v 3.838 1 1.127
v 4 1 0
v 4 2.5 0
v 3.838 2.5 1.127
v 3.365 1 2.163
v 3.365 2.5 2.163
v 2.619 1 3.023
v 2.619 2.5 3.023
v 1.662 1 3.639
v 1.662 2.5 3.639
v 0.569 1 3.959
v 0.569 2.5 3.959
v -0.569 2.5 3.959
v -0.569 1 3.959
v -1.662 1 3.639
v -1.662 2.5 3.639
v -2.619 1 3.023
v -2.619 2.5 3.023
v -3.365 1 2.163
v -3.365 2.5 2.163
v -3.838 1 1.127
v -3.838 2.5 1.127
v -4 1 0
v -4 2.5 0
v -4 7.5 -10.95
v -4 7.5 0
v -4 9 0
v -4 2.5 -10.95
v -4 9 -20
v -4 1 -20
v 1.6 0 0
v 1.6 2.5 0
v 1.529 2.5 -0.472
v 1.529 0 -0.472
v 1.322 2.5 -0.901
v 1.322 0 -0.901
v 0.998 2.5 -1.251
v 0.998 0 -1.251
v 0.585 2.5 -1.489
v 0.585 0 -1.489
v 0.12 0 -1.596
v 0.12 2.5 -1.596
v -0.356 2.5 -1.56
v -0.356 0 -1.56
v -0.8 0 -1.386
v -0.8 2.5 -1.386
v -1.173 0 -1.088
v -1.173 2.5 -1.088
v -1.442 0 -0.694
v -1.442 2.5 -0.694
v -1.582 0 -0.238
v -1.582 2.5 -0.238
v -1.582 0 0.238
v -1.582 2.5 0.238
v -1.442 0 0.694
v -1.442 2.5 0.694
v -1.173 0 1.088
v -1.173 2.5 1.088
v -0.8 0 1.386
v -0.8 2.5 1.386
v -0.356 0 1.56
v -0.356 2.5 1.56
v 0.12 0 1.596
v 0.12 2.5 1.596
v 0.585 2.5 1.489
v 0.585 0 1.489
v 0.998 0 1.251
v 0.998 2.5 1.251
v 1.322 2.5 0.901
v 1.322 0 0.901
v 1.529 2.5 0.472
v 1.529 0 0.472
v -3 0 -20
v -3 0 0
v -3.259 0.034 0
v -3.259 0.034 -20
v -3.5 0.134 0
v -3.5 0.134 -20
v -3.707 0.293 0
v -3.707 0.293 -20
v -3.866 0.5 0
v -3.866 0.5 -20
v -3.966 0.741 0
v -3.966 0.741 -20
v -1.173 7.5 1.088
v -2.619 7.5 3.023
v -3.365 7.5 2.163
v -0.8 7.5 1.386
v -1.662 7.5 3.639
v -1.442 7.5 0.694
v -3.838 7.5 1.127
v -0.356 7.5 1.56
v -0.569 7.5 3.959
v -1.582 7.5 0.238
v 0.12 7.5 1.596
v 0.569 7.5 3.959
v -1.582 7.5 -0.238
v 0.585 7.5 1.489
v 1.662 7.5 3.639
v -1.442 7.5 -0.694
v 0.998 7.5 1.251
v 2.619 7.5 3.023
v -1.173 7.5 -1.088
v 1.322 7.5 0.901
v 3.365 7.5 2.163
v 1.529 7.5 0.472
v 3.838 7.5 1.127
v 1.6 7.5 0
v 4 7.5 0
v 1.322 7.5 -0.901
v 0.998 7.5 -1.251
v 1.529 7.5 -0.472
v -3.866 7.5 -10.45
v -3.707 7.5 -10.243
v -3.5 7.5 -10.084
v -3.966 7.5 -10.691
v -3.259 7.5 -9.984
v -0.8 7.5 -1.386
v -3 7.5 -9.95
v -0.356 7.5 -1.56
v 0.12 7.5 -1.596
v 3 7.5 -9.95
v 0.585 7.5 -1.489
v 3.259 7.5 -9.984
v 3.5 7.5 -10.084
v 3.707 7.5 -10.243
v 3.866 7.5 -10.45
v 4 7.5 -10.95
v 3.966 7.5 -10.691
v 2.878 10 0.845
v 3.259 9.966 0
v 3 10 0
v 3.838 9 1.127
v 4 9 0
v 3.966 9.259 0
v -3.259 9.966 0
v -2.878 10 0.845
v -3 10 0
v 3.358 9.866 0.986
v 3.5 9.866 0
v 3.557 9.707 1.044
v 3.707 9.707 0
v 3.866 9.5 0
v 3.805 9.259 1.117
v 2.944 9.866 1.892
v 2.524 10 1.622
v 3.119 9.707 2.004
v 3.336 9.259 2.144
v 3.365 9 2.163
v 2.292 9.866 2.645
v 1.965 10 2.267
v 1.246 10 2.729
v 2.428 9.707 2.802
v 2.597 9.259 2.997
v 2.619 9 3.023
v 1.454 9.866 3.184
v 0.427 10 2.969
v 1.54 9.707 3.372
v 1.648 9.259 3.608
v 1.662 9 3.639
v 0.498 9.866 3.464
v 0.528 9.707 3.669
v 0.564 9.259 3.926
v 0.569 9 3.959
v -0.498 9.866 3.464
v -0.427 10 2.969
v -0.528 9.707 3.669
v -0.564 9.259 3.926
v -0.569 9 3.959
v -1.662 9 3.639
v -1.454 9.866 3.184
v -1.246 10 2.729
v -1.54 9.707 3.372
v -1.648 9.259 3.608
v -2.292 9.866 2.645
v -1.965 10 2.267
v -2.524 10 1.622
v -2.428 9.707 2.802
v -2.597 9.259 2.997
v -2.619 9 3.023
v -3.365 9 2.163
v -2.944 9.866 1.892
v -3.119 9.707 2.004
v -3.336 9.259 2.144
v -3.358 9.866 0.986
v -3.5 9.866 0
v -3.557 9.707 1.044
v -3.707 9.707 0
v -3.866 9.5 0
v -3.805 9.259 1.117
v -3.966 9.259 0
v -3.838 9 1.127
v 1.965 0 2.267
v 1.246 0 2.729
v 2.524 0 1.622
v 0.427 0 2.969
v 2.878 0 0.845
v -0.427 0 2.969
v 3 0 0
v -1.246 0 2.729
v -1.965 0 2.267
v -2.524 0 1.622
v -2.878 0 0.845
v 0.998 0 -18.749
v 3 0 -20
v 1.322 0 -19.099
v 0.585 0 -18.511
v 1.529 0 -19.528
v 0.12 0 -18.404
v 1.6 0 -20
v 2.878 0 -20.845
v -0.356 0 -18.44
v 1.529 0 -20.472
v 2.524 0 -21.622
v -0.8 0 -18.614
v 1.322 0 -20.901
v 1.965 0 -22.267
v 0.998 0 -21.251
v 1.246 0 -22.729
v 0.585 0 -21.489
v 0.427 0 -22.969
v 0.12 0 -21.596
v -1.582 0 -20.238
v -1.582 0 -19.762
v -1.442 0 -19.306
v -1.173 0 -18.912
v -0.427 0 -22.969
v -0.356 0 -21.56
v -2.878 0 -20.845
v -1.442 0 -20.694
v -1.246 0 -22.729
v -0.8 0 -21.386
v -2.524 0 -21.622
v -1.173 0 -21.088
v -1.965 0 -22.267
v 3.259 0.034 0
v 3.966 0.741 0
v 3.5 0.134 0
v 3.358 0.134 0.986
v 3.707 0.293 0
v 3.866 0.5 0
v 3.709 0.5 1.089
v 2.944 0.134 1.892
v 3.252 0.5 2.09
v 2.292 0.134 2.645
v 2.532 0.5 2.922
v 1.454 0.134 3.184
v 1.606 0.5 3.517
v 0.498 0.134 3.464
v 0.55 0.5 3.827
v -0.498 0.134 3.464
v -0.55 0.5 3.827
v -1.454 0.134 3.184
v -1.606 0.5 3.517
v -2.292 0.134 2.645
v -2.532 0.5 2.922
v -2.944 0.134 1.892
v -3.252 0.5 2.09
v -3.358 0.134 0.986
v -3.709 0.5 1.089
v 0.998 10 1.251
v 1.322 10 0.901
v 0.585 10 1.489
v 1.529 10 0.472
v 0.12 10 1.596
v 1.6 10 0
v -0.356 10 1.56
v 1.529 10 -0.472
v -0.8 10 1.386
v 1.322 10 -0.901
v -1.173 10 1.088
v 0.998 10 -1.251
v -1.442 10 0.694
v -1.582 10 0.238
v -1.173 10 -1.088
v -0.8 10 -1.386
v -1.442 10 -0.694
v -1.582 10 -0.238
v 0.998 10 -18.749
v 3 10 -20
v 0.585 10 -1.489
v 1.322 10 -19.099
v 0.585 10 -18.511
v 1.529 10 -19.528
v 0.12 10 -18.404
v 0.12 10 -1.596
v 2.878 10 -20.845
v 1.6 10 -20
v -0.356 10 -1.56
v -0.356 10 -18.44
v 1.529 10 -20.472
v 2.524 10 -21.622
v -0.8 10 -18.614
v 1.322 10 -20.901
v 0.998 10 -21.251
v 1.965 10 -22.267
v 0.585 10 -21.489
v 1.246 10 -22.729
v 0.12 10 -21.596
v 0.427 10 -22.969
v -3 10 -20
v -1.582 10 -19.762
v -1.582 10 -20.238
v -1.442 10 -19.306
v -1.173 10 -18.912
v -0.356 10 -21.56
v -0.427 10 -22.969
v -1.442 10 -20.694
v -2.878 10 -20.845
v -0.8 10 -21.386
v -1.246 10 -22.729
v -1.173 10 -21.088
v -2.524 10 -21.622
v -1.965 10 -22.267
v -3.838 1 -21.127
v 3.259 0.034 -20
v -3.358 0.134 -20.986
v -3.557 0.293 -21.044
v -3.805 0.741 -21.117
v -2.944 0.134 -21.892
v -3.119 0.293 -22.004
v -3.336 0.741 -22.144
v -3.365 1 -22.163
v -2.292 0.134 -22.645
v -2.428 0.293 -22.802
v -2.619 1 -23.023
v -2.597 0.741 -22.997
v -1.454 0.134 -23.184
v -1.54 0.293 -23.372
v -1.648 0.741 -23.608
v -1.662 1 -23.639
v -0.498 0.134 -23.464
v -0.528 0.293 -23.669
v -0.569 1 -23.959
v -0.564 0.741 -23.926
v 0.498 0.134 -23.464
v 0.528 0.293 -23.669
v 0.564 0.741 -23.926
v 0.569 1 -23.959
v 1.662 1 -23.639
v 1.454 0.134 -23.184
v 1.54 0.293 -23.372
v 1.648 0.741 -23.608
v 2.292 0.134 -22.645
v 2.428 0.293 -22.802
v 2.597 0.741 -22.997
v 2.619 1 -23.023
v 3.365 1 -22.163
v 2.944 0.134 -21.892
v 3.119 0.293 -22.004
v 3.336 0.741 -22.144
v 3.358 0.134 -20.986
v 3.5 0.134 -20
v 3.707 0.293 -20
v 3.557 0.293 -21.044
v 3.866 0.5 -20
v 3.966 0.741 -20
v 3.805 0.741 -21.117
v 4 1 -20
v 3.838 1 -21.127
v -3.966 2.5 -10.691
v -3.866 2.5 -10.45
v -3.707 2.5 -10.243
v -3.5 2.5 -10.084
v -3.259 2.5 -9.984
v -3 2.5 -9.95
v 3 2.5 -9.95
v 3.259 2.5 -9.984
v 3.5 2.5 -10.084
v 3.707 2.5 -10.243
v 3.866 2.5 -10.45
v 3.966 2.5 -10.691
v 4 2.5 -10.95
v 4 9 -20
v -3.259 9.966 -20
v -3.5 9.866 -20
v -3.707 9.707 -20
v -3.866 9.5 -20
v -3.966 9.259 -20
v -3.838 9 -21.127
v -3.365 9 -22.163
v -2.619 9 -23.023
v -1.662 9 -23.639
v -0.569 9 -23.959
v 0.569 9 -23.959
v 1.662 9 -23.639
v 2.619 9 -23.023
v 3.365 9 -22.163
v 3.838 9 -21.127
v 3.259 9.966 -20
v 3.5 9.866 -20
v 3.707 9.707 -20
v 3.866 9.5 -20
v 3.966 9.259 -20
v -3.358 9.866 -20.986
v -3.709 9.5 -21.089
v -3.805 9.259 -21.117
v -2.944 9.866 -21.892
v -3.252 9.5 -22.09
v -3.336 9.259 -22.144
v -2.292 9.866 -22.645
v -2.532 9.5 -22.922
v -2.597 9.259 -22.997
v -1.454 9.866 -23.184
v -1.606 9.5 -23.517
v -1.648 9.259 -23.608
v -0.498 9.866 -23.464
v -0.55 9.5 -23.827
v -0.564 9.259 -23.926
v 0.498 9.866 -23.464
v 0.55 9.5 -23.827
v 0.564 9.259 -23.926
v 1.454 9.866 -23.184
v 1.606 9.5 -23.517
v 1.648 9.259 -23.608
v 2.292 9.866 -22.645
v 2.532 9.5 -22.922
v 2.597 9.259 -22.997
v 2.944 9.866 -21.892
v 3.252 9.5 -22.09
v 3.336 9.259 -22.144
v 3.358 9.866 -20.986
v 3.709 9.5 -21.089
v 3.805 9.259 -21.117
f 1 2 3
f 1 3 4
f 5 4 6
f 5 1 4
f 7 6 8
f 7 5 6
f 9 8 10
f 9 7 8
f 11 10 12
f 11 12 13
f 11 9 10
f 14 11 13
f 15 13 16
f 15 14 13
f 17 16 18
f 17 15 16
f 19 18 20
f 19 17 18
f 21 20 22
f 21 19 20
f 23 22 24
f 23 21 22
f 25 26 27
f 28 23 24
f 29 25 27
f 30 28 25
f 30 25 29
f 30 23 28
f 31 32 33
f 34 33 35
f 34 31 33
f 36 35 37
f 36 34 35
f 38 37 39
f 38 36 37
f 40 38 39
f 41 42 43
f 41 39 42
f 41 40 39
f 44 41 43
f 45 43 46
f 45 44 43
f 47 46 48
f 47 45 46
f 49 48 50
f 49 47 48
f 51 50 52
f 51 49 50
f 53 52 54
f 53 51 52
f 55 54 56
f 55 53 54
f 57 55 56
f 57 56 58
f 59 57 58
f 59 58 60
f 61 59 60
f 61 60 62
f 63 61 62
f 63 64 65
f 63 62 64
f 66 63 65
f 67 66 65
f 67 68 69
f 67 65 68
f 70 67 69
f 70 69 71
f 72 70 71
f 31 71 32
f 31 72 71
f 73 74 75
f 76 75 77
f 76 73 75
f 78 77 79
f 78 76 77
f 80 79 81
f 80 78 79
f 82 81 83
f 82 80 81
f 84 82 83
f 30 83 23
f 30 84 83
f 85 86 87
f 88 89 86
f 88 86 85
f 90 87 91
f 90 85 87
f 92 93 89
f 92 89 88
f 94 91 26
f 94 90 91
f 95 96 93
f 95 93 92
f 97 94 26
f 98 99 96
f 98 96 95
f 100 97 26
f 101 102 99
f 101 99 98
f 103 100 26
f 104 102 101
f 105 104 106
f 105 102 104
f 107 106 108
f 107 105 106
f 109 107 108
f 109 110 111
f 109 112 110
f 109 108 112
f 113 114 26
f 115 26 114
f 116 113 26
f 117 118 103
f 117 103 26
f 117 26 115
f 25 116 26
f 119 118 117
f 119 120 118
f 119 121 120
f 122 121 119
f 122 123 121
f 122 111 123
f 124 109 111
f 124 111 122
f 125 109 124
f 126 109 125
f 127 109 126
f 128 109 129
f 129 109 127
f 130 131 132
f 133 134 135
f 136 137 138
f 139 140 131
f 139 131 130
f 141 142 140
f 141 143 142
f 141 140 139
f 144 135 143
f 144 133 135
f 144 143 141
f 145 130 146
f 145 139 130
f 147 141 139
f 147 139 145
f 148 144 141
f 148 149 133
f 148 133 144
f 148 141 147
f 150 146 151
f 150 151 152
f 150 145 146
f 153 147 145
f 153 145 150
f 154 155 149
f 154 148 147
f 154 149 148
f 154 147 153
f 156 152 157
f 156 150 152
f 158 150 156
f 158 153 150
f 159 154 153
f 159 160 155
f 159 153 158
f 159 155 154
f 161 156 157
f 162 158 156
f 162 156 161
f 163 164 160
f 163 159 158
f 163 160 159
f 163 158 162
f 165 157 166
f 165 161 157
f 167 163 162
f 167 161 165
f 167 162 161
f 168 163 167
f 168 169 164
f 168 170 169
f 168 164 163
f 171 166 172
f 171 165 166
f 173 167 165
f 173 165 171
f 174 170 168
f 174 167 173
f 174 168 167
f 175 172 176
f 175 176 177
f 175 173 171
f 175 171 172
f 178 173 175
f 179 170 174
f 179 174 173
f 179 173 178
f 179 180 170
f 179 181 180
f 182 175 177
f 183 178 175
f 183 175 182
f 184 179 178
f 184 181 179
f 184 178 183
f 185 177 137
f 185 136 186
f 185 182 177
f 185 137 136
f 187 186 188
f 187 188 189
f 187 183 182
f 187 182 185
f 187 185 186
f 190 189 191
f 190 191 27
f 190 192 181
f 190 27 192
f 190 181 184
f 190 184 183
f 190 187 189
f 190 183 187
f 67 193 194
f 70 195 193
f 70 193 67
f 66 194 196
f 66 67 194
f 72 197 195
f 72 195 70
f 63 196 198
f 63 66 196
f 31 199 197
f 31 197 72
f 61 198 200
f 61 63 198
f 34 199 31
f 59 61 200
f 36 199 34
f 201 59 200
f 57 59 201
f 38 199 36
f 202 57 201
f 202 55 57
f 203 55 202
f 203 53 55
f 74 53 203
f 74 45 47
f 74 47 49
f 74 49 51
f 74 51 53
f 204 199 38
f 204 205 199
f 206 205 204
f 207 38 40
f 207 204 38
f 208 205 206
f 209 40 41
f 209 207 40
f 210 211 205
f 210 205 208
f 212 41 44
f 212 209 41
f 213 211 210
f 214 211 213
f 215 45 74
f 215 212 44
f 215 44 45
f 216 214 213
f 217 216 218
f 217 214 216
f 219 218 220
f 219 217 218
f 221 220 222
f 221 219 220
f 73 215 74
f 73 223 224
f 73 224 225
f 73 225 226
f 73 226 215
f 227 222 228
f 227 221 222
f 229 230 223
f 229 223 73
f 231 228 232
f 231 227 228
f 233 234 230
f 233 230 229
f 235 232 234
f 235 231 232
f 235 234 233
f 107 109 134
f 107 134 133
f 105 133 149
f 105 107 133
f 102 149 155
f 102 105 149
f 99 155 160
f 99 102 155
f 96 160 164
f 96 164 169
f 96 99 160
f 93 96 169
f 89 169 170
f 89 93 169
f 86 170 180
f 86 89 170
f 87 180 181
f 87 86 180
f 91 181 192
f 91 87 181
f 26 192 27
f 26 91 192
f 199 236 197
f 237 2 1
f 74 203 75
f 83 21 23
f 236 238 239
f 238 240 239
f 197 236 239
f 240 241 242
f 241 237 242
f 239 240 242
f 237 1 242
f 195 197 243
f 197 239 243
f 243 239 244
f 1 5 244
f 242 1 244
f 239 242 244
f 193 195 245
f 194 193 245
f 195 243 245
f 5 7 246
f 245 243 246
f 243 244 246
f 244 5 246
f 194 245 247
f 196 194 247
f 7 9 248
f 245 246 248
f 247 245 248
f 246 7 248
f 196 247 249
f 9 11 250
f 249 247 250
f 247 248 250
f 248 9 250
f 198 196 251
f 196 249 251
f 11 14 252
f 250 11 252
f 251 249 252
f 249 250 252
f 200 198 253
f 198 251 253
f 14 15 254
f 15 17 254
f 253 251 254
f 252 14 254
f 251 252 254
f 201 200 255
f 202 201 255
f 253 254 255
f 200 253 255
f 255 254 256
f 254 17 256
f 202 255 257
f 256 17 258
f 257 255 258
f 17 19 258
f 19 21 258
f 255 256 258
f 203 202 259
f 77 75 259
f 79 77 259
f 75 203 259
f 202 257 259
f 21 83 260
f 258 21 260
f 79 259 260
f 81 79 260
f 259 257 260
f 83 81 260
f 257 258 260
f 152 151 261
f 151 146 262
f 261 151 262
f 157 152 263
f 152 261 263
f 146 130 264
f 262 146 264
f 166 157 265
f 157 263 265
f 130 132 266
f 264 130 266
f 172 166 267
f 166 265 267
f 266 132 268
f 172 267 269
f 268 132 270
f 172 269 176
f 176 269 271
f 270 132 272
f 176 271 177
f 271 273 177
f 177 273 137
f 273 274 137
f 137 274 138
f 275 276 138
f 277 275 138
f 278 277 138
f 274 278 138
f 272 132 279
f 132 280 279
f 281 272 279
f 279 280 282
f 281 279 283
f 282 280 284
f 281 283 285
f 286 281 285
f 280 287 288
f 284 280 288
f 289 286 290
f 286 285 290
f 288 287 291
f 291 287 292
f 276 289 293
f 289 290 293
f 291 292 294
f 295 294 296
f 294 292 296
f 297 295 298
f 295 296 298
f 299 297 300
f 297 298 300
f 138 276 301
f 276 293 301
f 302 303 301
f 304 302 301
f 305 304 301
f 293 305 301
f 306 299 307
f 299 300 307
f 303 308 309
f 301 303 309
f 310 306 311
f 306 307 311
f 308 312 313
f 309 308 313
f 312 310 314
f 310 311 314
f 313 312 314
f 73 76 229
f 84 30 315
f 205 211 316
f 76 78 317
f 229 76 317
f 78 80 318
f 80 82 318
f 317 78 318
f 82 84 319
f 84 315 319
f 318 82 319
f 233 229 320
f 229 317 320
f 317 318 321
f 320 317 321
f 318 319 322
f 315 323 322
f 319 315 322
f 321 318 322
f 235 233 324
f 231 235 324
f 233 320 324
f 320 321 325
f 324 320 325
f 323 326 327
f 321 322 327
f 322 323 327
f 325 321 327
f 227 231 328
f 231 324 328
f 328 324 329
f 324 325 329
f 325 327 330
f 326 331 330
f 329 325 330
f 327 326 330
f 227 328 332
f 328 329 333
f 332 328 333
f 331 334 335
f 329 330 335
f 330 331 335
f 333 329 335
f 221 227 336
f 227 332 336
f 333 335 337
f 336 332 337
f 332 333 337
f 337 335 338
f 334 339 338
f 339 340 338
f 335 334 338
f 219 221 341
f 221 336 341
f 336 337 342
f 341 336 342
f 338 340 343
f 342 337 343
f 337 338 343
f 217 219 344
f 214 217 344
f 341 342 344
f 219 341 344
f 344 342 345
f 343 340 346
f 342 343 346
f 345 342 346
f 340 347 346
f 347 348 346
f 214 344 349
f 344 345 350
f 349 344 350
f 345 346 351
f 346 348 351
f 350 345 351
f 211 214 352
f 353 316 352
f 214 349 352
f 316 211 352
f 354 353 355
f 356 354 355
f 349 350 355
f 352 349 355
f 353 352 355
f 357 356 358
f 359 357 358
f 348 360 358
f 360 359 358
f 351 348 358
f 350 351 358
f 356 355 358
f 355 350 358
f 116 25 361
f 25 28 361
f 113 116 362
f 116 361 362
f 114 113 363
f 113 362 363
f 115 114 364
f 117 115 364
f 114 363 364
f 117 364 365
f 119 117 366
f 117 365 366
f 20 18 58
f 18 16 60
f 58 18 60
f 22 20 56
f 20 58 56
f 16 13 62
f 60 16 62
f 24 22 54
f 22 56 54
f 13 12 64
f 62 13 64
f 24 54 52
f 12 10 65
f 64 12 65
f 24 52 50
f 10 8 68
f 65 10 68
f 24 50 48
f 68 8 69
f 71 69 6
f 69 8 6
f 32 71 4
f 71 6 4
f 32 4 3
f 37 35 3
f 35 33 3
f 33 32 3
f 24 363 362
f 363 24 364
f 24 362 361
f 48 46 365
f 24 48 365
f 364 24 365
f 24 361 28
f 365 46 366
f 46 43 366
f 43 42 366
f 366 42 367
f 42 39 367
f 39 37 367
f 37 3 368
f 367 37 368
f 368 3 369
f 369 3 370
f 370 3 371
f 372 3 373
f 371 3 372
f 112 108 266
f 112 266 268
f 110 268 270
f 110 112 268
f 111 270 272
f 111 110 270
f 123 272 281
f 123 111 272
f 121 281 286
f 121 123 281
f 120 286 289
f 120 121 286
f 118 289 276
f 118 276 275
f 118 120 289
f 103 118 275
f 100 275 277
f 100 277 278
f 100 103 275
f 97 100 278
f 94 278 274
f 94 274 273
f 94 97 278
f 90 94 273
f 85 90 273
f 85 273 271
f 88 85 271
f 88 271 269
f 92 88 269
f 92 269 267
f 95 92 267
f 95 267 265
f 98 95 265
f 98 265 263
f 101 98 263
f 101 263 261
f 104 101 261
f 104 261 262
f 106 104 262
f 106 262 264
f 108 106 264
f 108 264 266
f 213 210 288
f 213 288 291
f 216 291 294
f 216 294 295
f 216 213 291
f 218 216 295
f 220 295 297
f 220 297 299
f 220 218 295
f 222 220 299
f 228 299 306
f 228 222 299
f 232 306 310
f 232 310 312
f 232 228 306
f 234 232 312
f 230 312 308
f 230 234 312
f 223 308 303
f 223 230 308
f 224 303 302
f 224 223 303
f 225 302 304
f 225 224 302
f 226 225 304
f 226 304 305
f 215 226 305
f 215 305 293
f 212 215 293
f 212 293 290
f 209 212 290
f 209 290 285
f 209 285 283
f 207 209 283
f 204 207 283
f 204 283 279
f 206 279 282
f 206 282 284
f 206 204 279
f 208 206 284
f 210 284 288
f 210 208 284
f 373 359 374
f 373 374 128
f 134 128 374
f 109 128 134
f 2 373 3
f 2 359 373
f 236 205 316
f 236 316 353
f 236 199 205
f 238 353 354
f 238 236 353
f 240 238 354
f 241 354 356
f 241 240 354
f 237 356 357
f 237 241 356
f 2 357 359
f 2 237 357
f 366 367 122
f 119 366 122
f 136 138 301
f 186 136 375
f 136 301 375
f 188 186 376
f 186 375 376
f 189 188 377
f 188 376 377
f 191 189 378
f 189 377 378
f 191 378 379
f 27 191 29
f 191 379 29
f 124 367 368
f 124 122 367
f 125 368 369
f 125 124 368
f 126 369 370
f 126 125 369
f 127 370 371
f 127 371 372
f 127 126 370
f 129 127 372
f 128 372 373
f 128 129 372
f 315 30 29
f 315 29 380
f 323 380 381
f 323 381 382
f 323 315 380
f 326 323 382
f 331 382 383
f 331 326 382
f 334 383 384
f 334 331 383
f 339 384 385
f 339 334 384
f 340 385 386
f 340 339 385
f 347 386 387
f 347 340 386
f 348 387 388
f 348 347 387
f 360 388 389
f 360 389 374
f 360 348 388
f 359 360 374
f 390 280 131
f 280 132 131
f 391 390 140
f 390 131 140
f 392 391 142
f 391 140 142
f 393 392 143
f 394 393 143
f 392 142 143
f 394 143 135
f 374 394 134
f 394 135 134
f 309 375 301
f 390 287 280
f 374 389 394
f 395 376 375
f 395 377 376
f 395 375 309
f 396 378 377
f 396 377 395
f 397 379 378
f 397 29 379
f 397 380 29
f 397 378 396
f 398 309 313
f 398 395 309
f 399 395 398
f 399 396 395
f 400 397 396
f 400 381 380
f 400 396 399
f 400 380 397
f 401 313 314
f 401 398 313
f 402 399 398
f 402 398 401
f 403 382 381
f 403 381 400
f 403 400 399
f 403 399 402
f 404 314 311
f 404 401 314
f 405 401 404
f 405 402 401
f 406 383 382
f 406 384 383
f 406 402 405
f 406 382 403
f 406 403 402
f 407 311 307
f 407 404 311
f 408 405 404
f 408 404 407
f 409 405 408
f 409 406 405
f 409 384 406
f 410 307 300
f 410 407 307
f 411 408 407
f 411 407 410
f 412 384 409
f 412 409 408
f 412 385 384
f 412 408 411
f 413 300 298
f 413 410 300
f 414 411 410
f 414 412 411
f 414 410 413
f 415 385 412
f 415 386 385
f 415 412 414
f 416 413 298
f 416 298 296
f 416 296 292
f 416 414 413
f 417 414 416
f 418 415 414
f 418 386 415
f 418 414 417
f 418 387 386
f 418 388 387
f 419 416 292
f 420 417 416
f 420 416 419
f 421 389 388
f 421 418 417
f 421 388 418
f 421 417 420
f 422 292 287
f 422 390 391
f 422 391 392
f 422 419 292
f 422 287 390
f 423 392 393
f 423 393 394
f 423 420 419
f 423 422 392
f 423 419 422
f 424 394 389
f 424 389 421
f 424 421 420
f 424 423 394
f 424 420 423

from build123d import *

# Parameters (mm, degrees)
SKETCH_1_R          = 1.6
EXTRUDE_1_DEPTH     = 10
SKETCH_2_W          = 19.899365944
SKETCH_2_H          = 5
CUT_EXTRUDE_1_DEPTH = 10
FILLET_1_R          = 1


with BuildPart() as part:
    # 草图1 → 凸台-拉伸1 (new body)
    with BuildSketch(Plane(origin=(0, 0, 0), x_dir=(1, 0, 0), z_dir=(0, 1, 0))):
        with BuildLine():
            Line((-4, 0), (-4, 20))
            ThreePointArc((-4, 20), (0, 24), (4, 20))
            Line((4, 20), (4, 0))
            ThreePointArc((4, 0), (0, -4), (-4, 0))
        make_face()
        with Locations((0, 20)):
            Circle(SKETCH_1_R, mode=Mode.SUBTRACT)
        Circle(SKETCH_1_R, mode=Mode.SUBTRACT)
    extrude(amount=EXTRUDE_1_DEPTH)

    # 草图2 → 切除-拉伸1 (cut)
    with BuildSketch(Plane(origin=(4, 0, 0), x_dir=(0, 0, -1), z_dir=(1, 0, 0))):
        with Locations((0, 5)):
            Rectangle(SKETCH_2_W, SKETCH_2_H)
    extrude(amount=-CUT_EXTRUDE_1_DEPTH, mode=Mode.SUBTRACT)

    # 圆角1
    fillet_1_edges = [part.edges().sort_by_distance(p)[0] for p in [
        (4, 10, -10),
        (0, 10, -24),
        (-4, 5, -9.949682972),
        (-4, 10, -10),
        (4, 5, -9.949682972),
        (0, 10, 4),
        (0, 0, 4),
        (-4, 0, -10),
        (0, 0, -24),
        (4, 0, -10),
    ]]
    fillet(fillet_1_edges, radius=FILLET_1_R)


solid = part.part
